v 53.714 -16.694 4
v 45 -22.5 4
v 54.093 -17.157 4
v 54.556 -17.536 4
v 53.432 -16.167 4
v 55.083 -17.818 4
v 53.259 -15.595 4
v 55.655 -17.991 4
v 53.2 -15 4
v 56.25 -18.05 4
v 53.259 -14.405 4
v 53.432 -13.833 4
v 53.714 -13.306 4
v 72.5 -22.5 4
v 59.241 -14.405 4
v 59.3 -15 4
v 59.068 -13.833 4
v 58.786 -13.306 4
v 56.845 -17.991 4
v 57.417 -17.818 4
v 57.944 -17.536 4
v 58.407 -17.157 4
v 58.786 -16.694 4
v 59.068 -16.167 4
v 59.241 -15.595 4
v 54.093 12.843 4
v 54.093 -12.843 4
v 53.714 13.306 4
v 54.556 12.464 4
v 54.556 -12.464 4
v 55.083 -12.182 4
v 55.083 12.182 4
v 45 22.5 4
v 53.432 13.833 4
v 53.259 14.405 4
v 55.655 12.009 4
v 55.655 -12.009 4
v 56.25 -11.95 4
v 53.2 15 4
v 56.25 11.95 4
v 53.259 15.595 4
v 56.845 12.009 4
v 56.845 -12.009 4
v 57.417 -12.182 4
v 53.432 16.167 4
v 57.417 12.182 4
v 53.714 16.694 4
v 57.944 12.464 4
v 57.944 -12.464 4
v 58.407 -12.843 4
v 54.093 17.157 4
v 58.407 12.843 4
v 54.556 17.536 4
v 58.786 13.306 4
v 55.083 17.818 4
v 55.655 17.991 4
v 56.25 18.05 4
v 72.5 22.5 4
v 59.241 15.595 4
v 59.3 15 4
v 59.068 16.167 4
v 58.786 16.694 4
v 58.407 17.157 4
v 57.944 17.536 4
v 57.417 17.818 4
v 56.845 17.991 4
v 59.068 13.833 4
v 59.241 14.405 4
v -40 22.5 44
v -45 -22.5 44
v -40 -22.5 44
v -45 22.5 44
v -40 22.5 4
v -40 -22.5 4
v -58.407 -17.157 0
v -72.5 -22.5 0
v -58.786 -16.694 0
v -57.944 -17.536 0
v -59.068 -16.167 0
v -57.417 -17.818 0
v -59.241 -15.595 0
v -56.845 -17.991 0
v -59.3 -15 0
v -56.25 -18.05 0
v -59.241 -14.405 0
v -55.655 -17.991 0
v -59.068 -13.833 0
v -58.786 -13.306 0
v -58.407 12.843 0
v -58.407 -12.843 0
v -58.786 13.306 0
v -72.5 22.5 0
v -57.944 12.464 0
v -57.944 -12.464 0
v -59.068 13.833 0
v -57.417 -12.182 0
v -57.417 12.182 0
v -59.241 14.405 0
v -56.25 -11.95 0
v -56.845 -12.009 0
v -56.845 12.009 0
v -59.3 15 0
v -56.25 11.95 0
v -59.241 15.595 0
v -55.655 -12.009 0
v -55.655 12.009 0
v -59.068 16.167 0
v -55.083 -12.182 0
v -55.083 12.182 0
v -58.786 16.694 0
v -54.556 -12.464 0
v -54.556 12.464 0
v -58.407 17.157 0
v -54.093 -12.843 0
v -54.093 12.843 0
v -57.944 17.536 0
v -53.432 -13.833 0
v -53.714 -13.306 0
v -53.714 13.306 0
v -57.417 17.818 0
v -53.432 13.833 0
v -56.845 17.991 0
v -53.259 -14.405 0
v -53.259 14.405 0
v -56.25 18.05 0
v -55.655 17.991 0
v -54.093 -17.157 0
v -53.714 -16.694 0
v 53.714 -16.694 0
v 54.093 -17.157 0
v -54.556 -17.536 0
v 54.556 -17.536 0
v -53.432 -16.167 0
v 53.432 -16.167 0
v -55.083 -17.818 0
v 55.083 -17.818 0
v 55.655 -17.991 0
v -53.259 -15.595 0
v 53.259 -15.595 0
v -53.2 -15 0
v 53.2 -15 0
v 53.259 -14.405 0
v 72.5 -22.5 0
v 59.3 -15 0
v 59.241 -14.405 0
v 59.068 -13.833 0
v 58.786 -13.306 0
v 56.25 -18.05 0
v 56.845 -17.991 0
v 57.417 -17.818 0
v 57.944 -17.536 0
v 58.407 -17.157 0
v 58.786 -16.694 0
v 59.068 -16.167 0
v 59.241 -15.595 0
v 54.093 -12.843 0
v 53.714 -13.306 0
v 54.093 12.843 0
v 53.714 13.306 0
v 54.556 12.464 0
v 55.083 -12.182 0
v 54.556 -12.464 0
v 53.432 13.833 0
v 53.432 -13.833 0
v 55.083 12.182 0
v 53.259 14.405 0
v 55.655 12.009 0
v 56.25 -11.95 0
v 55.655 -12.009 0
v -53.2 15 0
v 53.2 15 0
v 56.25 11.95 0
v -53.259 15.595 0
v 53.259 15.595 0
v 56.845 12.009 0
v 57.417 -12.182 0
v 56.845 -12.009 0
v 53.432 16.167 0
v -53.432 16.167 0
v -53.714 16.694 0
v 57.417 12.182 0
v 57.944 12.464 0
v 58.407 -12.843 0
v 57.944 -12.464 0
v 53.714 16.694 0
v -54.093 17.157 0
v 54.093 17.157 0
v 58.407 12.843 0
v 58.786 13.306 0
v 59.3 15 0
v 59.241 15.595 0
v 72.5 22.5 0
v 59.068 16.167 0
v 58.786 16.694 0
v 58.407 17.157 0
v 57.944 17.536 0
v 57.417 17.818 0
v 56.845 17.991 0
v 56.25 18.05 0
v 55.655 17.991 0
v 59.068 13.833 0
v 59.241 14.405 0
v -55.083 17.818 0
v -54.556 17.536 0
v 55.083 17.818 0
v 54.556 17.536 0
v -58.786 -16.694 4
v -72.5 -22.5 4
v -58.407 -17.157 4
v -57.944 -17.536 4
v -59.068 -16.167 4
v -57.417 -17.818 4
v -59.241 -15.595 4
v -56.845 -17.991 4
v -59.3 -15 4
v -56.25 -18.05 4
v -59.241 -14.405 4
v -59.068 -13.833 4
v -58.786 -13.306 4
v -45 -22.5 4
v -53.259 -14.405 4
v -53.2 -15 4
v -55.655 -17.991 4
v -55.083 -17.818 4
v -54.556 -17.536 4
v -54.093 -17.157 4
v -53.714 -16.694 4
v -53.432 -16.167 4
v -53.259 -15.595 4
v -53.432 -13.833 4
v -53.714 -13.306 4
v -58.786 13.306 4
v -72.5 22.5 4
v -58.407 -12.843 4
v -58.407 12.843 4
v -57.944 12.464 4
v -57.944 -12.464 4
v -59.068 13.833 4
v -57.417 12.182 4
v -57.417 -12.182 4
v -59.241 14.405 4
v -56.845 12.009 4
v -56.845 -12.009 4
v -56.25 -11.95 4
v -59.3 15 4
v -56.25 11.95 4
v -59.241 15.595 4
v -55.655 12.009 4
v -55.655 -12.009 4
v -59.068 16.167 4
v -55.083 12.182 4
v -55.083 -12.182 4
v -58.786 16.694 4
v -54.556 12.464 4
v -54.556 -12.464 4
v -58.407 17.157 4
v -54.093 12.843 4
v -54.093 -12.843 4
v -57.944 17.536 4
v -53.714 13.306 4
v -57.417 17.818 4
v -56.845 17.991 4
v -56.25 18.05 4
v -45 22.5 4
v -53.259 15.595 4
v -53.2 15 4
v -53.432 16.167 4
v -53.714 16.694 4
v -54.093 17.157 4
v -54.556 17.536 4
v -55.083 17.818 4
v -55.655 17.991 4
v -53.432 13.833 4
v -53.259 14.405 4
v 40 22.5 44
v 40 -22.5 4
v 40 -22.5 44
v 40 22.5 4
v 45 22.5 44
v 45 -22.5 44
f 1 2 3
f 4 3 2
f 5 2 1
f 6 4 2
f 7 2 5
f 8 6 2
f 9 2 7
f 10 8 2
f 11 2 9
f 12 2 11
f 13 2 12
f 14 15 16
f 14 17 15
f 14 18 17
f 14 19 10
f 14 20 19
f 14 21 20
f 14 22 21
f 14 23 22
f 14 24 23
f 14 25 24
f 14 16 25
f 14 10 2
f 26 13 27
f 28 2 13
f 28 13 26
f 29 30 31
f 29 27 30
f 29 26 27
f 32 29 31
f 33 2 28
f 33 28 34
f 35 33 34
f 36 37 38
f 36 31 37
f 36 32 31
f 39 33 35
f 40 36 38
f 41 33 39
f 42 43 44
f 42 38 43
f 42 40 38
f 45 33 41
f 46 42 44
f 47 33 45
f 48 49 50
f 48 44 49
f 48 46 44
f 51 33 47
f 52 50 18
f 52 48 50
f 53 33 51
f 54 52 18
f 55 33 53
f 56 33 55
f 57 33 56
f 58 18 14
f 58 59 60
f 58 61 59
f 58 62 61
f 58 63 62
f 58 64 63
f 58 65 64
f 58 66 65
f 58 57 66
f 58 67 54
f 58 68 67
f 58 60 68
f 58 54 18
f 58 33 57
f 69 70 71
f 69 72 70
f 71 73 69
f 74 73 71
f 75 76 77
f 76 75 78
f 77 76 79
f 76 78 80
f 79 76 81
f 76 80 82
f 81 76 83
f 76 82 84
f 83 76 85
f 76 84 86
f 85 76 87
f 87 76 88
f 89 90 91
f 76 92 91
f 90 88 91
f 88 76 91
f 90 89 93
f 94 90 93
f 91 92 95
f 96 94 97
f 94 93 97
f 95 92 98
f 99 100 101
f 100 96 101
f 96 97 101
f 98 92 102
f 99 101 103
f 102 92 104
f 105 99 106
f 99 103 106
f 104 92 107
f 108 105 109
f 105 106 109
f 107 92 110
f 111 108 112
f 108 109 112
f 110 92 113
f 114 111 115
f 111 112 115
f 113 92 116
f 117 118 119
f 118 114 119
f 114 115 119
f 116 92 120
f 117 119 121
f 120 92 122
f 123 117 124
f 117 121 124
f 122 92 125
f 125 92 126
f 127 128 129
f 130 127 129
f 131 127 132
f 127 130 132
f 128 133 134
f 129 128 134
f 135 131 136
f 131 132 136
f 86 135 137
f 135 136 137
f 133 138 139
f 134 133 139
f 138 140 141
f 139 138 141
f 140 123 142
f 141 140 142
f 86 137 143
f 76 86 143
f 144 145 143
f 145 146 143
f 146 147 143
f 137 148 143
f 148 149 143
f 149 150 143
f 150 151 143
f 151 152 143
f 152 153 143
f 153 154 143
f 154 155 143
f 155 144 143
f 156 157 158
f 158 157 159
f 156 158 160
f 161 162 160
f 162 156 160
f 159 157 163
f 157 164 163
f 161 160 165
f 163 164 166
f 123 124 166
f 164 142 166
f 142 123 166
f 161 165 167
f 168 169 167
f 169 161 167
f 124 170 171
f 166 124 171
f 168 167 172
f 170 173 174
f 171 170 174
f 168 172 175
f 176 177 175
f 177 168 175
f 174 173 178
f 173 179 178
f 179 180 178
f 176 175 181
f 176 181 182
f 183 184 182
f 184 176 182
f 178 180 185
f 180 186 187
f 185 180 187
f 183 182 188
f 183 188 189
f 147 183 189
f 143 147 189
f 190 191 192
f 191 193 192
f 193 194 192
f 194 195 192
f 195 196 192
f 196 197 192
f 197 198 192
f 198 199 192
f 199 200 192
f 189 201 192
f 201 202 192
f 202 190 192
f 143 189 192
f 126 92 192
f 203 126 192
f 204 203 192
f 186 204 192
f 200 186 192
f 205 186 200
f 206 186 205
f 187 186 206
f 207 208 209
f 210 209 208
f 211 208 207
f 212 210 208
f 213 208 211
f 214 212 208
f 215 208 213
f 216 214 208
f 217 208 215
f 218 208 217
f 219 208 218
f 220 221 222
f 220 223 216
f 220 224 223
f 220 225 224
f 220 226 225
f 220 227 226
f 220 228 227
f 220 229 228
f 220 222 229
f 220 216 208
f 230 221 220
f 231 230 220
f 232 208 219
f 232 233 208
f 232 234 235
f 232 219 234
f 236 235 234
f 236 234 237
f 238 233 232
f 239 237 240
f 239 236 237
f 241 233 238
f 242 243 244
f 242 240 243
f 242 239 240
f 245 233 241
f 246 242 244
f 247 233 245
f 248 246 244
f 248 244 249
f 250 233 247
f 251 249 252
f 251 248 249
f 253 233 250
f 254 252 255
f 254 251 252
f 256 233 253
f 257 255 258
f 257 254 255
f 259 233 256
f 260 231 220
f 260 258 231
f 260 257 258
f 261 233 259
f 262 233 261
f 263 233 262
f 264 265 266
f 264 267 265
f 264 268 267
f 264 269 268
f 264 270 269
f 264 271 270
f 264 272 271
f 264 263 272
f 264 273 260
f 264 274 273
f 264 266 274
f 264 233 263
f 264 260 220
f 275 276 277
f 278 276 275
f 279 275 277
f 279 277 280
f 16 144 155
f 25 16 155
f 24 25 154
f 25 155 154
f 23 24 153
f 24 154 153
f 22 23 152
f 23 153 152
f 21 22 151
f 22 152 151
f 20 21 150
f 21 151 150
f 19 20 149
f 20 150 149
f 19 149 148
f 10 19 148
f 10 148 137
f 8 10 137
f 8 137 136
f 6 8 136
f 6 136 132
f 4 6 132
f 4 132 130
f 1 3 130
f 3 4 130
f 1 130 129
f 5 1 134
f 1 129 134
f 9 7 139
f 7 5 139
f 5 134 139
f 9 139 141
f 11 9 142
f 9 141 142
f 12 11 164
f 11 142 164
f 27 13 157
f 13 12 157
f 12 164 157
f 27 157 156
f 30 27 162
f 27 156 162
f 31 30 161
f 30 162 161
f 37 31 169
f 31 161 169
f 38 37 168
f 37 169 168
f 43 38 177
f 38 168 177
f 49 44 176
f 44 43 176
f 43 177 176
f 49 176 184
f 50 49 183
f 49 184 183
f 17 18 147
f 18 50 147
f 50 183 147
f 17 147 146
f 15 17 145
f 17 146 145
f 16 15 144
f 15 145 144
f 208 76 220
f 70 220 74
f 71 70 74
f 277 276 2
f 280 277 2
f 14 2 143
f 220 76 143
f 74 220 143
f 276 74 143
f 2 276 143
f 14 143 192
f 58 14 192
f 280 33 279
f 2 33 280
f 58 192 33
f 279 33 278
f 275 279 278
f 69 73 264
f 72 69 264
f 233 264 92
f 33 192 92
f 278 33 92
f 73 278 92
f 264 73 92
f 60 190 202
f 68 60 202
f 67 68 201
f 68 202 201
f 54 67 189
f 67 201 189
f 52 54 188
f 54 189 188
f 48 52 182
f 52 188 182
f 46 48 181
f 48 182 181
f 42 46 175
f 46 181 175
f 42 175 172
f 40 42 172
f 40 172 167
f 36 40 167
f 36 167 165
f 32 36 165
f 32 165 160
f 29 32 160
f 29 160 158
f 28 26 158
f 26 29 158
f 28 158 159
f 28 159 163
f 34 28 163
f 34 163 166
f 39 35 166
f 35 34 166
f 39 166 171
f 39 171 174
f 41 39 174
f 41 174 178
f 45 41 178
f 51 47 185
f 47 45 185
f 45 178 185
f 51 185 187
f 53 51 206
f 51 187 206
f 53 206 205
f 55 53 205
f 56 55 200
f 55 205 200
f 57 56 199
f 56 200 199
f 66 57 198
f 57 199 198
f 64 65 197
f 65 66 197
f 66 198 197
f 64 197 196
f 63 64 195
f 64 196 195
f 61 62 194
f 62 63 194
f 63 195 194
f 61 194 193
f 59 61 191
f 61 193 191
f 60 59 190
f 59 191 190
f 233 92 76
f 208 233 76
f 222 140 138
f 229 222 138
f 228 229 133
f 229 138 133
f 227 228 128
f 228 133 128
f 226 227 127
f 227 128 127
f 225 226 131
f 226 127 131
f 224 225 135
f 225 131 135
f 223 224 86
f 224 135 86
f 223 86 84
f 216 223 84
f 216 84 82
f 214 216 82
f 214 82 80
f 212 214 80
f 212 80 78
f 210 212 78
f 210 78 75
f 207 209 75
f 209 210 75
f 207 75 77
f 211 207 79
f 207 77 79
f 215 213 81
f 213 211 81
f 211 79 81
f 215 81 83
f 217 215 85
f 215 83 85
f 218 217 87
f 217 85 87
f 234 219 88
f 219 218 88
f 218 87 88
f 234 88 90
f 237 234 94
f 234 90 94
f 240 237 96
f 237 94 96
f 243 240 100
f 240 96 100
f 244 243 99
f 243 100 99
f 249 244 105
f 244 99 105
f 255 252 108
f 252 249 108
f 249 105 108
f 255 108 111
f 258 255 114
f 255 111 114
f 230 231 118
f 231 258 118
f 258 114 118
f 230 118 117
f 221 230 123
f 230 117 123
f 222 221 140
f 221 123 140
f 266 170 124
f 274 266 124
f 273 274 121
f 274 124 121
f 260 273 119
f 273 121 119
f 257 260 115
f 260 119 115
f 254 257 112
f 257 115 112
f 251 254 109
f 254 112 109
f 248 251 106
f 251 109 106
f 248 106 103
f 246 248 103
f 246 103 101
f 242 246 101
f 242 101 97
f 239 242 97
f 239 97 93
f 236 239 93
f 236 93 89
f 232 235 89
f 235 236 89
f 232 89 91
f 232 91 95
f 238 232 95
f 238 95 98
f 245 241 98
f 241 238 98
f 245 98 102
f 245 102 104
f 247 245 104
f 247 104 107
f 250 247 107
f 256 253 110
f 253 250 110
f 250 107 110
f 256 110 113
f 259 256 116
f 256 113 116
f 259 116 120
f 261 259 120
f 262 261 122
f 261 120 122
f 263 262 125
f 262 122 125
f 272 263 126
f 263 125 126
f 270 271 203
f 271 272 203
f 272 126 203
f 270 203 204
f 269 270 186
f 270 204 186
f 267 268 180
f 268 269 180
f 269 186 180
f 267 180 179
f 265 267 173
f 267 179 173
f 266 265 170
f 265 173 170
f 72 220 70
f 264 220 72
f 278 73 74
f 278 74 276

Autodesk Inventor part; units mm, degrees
ref_plane "YZ Plane" through (0, 0, 0) normal (1, 0, 0) x (0, 1, 0)
ref_plane "XZ Plane" through (0, 0, 0) normal (0, 1, 0) x (-1, 0, 0)
ref_plane "XY Plane" through (0, 0, 0) normal (0, 0, 1) x (1, 0, 0)
sketch "Sketch1" plane through (0, 0, 0) normal (0, 0, 1) x (1, 0, 0)
  line L0 (-56.25, -15) -> (56.25, -15) construction
  line L1 (56.25, -15) -> (56.25, 15) construction
  line L2 (56.25, 15) -> (-56.25, 15) construction
  line L3 (-56.25, 15) -> (-56.25, -15) construction
  line L4 (-56.25, -15) -> (56.25, 15) construction
  line L5 (56.25, -15) -> (-56.25, 15) construction
  circle A0 centre (-56.25, 15) radius 3.05
  circle A1 centre (56.25, 15) radius 3.05
  circle A2 centre (56.25, -15) radius 3.05
  circle A3 centre (-56.25, -15) radius 3.05
  line L6 (-72.5, -22.5) -> (72.5, -22.5)
  line L7 (72.5, -22.5) -> (72.5, 22.5)
  line L8 (72.5, 22.5) -> (-72.5, 22.5)
  line L9 (-72.5, 22.5) -> (-72.5, -22.5)
  line L10 (-72.5, -22.5) -> (72.5, 22.5) construction
  line L11 (72.5, -22.5) -> (-72.5, 22.5) construction
  point P0 (0, 0)
  dimension "d0" = 112.5
  dimension "d1" = 30
  dimension "d2" = 6.1
  dimension "d3" = 145
  dimension "d4" = 45
extrude "Extrusion1" add sketch "Sketch1" along normal blind 4
sketch "Sketch2" plane through (0, 0, 4) normal (0, 0, 1) x (1, 0, 0)
  line L0 (72.5, 22.5) -> (-72.5, 22.5) projected
  line L1 (-72.5, -22.5) -> (72.5, -22.5) projected
  line L2 (-45, 22.5) -> (-40, 22.5)
  line L3 (-40, 22.5) -> (-40, -22.5)
  line L4 (-40, -22.5) -> (-45, -22.5)
  line L5 (-45, -22.5) -> (-45, 22.5)
  line L6 (40, 22.5) -> (45, 22.5)
  line L7 (45, 22.5) -> (45, -22.5)
  line L8 (45, -22.5) -> (40, -22.5)
  line L9 (40, -22.5) -> (40, 22.5)
  line L10 (-72.5, 22.5) -> (-72.5, -22.5) projected
  point P0 (0, 0)
  dimension "d7" = 5
  dimension "d8" = 5
  dimension "d9" = 80
  dimension "d10" = 27.5
extrude "Extrusion2" add sketch "Sketch2" along normal blind 40 contours L7 L1 L9 L0 | L3 L1 L5 L0
properties part number "WheelModuleBracket" material "ABS Plastic"
